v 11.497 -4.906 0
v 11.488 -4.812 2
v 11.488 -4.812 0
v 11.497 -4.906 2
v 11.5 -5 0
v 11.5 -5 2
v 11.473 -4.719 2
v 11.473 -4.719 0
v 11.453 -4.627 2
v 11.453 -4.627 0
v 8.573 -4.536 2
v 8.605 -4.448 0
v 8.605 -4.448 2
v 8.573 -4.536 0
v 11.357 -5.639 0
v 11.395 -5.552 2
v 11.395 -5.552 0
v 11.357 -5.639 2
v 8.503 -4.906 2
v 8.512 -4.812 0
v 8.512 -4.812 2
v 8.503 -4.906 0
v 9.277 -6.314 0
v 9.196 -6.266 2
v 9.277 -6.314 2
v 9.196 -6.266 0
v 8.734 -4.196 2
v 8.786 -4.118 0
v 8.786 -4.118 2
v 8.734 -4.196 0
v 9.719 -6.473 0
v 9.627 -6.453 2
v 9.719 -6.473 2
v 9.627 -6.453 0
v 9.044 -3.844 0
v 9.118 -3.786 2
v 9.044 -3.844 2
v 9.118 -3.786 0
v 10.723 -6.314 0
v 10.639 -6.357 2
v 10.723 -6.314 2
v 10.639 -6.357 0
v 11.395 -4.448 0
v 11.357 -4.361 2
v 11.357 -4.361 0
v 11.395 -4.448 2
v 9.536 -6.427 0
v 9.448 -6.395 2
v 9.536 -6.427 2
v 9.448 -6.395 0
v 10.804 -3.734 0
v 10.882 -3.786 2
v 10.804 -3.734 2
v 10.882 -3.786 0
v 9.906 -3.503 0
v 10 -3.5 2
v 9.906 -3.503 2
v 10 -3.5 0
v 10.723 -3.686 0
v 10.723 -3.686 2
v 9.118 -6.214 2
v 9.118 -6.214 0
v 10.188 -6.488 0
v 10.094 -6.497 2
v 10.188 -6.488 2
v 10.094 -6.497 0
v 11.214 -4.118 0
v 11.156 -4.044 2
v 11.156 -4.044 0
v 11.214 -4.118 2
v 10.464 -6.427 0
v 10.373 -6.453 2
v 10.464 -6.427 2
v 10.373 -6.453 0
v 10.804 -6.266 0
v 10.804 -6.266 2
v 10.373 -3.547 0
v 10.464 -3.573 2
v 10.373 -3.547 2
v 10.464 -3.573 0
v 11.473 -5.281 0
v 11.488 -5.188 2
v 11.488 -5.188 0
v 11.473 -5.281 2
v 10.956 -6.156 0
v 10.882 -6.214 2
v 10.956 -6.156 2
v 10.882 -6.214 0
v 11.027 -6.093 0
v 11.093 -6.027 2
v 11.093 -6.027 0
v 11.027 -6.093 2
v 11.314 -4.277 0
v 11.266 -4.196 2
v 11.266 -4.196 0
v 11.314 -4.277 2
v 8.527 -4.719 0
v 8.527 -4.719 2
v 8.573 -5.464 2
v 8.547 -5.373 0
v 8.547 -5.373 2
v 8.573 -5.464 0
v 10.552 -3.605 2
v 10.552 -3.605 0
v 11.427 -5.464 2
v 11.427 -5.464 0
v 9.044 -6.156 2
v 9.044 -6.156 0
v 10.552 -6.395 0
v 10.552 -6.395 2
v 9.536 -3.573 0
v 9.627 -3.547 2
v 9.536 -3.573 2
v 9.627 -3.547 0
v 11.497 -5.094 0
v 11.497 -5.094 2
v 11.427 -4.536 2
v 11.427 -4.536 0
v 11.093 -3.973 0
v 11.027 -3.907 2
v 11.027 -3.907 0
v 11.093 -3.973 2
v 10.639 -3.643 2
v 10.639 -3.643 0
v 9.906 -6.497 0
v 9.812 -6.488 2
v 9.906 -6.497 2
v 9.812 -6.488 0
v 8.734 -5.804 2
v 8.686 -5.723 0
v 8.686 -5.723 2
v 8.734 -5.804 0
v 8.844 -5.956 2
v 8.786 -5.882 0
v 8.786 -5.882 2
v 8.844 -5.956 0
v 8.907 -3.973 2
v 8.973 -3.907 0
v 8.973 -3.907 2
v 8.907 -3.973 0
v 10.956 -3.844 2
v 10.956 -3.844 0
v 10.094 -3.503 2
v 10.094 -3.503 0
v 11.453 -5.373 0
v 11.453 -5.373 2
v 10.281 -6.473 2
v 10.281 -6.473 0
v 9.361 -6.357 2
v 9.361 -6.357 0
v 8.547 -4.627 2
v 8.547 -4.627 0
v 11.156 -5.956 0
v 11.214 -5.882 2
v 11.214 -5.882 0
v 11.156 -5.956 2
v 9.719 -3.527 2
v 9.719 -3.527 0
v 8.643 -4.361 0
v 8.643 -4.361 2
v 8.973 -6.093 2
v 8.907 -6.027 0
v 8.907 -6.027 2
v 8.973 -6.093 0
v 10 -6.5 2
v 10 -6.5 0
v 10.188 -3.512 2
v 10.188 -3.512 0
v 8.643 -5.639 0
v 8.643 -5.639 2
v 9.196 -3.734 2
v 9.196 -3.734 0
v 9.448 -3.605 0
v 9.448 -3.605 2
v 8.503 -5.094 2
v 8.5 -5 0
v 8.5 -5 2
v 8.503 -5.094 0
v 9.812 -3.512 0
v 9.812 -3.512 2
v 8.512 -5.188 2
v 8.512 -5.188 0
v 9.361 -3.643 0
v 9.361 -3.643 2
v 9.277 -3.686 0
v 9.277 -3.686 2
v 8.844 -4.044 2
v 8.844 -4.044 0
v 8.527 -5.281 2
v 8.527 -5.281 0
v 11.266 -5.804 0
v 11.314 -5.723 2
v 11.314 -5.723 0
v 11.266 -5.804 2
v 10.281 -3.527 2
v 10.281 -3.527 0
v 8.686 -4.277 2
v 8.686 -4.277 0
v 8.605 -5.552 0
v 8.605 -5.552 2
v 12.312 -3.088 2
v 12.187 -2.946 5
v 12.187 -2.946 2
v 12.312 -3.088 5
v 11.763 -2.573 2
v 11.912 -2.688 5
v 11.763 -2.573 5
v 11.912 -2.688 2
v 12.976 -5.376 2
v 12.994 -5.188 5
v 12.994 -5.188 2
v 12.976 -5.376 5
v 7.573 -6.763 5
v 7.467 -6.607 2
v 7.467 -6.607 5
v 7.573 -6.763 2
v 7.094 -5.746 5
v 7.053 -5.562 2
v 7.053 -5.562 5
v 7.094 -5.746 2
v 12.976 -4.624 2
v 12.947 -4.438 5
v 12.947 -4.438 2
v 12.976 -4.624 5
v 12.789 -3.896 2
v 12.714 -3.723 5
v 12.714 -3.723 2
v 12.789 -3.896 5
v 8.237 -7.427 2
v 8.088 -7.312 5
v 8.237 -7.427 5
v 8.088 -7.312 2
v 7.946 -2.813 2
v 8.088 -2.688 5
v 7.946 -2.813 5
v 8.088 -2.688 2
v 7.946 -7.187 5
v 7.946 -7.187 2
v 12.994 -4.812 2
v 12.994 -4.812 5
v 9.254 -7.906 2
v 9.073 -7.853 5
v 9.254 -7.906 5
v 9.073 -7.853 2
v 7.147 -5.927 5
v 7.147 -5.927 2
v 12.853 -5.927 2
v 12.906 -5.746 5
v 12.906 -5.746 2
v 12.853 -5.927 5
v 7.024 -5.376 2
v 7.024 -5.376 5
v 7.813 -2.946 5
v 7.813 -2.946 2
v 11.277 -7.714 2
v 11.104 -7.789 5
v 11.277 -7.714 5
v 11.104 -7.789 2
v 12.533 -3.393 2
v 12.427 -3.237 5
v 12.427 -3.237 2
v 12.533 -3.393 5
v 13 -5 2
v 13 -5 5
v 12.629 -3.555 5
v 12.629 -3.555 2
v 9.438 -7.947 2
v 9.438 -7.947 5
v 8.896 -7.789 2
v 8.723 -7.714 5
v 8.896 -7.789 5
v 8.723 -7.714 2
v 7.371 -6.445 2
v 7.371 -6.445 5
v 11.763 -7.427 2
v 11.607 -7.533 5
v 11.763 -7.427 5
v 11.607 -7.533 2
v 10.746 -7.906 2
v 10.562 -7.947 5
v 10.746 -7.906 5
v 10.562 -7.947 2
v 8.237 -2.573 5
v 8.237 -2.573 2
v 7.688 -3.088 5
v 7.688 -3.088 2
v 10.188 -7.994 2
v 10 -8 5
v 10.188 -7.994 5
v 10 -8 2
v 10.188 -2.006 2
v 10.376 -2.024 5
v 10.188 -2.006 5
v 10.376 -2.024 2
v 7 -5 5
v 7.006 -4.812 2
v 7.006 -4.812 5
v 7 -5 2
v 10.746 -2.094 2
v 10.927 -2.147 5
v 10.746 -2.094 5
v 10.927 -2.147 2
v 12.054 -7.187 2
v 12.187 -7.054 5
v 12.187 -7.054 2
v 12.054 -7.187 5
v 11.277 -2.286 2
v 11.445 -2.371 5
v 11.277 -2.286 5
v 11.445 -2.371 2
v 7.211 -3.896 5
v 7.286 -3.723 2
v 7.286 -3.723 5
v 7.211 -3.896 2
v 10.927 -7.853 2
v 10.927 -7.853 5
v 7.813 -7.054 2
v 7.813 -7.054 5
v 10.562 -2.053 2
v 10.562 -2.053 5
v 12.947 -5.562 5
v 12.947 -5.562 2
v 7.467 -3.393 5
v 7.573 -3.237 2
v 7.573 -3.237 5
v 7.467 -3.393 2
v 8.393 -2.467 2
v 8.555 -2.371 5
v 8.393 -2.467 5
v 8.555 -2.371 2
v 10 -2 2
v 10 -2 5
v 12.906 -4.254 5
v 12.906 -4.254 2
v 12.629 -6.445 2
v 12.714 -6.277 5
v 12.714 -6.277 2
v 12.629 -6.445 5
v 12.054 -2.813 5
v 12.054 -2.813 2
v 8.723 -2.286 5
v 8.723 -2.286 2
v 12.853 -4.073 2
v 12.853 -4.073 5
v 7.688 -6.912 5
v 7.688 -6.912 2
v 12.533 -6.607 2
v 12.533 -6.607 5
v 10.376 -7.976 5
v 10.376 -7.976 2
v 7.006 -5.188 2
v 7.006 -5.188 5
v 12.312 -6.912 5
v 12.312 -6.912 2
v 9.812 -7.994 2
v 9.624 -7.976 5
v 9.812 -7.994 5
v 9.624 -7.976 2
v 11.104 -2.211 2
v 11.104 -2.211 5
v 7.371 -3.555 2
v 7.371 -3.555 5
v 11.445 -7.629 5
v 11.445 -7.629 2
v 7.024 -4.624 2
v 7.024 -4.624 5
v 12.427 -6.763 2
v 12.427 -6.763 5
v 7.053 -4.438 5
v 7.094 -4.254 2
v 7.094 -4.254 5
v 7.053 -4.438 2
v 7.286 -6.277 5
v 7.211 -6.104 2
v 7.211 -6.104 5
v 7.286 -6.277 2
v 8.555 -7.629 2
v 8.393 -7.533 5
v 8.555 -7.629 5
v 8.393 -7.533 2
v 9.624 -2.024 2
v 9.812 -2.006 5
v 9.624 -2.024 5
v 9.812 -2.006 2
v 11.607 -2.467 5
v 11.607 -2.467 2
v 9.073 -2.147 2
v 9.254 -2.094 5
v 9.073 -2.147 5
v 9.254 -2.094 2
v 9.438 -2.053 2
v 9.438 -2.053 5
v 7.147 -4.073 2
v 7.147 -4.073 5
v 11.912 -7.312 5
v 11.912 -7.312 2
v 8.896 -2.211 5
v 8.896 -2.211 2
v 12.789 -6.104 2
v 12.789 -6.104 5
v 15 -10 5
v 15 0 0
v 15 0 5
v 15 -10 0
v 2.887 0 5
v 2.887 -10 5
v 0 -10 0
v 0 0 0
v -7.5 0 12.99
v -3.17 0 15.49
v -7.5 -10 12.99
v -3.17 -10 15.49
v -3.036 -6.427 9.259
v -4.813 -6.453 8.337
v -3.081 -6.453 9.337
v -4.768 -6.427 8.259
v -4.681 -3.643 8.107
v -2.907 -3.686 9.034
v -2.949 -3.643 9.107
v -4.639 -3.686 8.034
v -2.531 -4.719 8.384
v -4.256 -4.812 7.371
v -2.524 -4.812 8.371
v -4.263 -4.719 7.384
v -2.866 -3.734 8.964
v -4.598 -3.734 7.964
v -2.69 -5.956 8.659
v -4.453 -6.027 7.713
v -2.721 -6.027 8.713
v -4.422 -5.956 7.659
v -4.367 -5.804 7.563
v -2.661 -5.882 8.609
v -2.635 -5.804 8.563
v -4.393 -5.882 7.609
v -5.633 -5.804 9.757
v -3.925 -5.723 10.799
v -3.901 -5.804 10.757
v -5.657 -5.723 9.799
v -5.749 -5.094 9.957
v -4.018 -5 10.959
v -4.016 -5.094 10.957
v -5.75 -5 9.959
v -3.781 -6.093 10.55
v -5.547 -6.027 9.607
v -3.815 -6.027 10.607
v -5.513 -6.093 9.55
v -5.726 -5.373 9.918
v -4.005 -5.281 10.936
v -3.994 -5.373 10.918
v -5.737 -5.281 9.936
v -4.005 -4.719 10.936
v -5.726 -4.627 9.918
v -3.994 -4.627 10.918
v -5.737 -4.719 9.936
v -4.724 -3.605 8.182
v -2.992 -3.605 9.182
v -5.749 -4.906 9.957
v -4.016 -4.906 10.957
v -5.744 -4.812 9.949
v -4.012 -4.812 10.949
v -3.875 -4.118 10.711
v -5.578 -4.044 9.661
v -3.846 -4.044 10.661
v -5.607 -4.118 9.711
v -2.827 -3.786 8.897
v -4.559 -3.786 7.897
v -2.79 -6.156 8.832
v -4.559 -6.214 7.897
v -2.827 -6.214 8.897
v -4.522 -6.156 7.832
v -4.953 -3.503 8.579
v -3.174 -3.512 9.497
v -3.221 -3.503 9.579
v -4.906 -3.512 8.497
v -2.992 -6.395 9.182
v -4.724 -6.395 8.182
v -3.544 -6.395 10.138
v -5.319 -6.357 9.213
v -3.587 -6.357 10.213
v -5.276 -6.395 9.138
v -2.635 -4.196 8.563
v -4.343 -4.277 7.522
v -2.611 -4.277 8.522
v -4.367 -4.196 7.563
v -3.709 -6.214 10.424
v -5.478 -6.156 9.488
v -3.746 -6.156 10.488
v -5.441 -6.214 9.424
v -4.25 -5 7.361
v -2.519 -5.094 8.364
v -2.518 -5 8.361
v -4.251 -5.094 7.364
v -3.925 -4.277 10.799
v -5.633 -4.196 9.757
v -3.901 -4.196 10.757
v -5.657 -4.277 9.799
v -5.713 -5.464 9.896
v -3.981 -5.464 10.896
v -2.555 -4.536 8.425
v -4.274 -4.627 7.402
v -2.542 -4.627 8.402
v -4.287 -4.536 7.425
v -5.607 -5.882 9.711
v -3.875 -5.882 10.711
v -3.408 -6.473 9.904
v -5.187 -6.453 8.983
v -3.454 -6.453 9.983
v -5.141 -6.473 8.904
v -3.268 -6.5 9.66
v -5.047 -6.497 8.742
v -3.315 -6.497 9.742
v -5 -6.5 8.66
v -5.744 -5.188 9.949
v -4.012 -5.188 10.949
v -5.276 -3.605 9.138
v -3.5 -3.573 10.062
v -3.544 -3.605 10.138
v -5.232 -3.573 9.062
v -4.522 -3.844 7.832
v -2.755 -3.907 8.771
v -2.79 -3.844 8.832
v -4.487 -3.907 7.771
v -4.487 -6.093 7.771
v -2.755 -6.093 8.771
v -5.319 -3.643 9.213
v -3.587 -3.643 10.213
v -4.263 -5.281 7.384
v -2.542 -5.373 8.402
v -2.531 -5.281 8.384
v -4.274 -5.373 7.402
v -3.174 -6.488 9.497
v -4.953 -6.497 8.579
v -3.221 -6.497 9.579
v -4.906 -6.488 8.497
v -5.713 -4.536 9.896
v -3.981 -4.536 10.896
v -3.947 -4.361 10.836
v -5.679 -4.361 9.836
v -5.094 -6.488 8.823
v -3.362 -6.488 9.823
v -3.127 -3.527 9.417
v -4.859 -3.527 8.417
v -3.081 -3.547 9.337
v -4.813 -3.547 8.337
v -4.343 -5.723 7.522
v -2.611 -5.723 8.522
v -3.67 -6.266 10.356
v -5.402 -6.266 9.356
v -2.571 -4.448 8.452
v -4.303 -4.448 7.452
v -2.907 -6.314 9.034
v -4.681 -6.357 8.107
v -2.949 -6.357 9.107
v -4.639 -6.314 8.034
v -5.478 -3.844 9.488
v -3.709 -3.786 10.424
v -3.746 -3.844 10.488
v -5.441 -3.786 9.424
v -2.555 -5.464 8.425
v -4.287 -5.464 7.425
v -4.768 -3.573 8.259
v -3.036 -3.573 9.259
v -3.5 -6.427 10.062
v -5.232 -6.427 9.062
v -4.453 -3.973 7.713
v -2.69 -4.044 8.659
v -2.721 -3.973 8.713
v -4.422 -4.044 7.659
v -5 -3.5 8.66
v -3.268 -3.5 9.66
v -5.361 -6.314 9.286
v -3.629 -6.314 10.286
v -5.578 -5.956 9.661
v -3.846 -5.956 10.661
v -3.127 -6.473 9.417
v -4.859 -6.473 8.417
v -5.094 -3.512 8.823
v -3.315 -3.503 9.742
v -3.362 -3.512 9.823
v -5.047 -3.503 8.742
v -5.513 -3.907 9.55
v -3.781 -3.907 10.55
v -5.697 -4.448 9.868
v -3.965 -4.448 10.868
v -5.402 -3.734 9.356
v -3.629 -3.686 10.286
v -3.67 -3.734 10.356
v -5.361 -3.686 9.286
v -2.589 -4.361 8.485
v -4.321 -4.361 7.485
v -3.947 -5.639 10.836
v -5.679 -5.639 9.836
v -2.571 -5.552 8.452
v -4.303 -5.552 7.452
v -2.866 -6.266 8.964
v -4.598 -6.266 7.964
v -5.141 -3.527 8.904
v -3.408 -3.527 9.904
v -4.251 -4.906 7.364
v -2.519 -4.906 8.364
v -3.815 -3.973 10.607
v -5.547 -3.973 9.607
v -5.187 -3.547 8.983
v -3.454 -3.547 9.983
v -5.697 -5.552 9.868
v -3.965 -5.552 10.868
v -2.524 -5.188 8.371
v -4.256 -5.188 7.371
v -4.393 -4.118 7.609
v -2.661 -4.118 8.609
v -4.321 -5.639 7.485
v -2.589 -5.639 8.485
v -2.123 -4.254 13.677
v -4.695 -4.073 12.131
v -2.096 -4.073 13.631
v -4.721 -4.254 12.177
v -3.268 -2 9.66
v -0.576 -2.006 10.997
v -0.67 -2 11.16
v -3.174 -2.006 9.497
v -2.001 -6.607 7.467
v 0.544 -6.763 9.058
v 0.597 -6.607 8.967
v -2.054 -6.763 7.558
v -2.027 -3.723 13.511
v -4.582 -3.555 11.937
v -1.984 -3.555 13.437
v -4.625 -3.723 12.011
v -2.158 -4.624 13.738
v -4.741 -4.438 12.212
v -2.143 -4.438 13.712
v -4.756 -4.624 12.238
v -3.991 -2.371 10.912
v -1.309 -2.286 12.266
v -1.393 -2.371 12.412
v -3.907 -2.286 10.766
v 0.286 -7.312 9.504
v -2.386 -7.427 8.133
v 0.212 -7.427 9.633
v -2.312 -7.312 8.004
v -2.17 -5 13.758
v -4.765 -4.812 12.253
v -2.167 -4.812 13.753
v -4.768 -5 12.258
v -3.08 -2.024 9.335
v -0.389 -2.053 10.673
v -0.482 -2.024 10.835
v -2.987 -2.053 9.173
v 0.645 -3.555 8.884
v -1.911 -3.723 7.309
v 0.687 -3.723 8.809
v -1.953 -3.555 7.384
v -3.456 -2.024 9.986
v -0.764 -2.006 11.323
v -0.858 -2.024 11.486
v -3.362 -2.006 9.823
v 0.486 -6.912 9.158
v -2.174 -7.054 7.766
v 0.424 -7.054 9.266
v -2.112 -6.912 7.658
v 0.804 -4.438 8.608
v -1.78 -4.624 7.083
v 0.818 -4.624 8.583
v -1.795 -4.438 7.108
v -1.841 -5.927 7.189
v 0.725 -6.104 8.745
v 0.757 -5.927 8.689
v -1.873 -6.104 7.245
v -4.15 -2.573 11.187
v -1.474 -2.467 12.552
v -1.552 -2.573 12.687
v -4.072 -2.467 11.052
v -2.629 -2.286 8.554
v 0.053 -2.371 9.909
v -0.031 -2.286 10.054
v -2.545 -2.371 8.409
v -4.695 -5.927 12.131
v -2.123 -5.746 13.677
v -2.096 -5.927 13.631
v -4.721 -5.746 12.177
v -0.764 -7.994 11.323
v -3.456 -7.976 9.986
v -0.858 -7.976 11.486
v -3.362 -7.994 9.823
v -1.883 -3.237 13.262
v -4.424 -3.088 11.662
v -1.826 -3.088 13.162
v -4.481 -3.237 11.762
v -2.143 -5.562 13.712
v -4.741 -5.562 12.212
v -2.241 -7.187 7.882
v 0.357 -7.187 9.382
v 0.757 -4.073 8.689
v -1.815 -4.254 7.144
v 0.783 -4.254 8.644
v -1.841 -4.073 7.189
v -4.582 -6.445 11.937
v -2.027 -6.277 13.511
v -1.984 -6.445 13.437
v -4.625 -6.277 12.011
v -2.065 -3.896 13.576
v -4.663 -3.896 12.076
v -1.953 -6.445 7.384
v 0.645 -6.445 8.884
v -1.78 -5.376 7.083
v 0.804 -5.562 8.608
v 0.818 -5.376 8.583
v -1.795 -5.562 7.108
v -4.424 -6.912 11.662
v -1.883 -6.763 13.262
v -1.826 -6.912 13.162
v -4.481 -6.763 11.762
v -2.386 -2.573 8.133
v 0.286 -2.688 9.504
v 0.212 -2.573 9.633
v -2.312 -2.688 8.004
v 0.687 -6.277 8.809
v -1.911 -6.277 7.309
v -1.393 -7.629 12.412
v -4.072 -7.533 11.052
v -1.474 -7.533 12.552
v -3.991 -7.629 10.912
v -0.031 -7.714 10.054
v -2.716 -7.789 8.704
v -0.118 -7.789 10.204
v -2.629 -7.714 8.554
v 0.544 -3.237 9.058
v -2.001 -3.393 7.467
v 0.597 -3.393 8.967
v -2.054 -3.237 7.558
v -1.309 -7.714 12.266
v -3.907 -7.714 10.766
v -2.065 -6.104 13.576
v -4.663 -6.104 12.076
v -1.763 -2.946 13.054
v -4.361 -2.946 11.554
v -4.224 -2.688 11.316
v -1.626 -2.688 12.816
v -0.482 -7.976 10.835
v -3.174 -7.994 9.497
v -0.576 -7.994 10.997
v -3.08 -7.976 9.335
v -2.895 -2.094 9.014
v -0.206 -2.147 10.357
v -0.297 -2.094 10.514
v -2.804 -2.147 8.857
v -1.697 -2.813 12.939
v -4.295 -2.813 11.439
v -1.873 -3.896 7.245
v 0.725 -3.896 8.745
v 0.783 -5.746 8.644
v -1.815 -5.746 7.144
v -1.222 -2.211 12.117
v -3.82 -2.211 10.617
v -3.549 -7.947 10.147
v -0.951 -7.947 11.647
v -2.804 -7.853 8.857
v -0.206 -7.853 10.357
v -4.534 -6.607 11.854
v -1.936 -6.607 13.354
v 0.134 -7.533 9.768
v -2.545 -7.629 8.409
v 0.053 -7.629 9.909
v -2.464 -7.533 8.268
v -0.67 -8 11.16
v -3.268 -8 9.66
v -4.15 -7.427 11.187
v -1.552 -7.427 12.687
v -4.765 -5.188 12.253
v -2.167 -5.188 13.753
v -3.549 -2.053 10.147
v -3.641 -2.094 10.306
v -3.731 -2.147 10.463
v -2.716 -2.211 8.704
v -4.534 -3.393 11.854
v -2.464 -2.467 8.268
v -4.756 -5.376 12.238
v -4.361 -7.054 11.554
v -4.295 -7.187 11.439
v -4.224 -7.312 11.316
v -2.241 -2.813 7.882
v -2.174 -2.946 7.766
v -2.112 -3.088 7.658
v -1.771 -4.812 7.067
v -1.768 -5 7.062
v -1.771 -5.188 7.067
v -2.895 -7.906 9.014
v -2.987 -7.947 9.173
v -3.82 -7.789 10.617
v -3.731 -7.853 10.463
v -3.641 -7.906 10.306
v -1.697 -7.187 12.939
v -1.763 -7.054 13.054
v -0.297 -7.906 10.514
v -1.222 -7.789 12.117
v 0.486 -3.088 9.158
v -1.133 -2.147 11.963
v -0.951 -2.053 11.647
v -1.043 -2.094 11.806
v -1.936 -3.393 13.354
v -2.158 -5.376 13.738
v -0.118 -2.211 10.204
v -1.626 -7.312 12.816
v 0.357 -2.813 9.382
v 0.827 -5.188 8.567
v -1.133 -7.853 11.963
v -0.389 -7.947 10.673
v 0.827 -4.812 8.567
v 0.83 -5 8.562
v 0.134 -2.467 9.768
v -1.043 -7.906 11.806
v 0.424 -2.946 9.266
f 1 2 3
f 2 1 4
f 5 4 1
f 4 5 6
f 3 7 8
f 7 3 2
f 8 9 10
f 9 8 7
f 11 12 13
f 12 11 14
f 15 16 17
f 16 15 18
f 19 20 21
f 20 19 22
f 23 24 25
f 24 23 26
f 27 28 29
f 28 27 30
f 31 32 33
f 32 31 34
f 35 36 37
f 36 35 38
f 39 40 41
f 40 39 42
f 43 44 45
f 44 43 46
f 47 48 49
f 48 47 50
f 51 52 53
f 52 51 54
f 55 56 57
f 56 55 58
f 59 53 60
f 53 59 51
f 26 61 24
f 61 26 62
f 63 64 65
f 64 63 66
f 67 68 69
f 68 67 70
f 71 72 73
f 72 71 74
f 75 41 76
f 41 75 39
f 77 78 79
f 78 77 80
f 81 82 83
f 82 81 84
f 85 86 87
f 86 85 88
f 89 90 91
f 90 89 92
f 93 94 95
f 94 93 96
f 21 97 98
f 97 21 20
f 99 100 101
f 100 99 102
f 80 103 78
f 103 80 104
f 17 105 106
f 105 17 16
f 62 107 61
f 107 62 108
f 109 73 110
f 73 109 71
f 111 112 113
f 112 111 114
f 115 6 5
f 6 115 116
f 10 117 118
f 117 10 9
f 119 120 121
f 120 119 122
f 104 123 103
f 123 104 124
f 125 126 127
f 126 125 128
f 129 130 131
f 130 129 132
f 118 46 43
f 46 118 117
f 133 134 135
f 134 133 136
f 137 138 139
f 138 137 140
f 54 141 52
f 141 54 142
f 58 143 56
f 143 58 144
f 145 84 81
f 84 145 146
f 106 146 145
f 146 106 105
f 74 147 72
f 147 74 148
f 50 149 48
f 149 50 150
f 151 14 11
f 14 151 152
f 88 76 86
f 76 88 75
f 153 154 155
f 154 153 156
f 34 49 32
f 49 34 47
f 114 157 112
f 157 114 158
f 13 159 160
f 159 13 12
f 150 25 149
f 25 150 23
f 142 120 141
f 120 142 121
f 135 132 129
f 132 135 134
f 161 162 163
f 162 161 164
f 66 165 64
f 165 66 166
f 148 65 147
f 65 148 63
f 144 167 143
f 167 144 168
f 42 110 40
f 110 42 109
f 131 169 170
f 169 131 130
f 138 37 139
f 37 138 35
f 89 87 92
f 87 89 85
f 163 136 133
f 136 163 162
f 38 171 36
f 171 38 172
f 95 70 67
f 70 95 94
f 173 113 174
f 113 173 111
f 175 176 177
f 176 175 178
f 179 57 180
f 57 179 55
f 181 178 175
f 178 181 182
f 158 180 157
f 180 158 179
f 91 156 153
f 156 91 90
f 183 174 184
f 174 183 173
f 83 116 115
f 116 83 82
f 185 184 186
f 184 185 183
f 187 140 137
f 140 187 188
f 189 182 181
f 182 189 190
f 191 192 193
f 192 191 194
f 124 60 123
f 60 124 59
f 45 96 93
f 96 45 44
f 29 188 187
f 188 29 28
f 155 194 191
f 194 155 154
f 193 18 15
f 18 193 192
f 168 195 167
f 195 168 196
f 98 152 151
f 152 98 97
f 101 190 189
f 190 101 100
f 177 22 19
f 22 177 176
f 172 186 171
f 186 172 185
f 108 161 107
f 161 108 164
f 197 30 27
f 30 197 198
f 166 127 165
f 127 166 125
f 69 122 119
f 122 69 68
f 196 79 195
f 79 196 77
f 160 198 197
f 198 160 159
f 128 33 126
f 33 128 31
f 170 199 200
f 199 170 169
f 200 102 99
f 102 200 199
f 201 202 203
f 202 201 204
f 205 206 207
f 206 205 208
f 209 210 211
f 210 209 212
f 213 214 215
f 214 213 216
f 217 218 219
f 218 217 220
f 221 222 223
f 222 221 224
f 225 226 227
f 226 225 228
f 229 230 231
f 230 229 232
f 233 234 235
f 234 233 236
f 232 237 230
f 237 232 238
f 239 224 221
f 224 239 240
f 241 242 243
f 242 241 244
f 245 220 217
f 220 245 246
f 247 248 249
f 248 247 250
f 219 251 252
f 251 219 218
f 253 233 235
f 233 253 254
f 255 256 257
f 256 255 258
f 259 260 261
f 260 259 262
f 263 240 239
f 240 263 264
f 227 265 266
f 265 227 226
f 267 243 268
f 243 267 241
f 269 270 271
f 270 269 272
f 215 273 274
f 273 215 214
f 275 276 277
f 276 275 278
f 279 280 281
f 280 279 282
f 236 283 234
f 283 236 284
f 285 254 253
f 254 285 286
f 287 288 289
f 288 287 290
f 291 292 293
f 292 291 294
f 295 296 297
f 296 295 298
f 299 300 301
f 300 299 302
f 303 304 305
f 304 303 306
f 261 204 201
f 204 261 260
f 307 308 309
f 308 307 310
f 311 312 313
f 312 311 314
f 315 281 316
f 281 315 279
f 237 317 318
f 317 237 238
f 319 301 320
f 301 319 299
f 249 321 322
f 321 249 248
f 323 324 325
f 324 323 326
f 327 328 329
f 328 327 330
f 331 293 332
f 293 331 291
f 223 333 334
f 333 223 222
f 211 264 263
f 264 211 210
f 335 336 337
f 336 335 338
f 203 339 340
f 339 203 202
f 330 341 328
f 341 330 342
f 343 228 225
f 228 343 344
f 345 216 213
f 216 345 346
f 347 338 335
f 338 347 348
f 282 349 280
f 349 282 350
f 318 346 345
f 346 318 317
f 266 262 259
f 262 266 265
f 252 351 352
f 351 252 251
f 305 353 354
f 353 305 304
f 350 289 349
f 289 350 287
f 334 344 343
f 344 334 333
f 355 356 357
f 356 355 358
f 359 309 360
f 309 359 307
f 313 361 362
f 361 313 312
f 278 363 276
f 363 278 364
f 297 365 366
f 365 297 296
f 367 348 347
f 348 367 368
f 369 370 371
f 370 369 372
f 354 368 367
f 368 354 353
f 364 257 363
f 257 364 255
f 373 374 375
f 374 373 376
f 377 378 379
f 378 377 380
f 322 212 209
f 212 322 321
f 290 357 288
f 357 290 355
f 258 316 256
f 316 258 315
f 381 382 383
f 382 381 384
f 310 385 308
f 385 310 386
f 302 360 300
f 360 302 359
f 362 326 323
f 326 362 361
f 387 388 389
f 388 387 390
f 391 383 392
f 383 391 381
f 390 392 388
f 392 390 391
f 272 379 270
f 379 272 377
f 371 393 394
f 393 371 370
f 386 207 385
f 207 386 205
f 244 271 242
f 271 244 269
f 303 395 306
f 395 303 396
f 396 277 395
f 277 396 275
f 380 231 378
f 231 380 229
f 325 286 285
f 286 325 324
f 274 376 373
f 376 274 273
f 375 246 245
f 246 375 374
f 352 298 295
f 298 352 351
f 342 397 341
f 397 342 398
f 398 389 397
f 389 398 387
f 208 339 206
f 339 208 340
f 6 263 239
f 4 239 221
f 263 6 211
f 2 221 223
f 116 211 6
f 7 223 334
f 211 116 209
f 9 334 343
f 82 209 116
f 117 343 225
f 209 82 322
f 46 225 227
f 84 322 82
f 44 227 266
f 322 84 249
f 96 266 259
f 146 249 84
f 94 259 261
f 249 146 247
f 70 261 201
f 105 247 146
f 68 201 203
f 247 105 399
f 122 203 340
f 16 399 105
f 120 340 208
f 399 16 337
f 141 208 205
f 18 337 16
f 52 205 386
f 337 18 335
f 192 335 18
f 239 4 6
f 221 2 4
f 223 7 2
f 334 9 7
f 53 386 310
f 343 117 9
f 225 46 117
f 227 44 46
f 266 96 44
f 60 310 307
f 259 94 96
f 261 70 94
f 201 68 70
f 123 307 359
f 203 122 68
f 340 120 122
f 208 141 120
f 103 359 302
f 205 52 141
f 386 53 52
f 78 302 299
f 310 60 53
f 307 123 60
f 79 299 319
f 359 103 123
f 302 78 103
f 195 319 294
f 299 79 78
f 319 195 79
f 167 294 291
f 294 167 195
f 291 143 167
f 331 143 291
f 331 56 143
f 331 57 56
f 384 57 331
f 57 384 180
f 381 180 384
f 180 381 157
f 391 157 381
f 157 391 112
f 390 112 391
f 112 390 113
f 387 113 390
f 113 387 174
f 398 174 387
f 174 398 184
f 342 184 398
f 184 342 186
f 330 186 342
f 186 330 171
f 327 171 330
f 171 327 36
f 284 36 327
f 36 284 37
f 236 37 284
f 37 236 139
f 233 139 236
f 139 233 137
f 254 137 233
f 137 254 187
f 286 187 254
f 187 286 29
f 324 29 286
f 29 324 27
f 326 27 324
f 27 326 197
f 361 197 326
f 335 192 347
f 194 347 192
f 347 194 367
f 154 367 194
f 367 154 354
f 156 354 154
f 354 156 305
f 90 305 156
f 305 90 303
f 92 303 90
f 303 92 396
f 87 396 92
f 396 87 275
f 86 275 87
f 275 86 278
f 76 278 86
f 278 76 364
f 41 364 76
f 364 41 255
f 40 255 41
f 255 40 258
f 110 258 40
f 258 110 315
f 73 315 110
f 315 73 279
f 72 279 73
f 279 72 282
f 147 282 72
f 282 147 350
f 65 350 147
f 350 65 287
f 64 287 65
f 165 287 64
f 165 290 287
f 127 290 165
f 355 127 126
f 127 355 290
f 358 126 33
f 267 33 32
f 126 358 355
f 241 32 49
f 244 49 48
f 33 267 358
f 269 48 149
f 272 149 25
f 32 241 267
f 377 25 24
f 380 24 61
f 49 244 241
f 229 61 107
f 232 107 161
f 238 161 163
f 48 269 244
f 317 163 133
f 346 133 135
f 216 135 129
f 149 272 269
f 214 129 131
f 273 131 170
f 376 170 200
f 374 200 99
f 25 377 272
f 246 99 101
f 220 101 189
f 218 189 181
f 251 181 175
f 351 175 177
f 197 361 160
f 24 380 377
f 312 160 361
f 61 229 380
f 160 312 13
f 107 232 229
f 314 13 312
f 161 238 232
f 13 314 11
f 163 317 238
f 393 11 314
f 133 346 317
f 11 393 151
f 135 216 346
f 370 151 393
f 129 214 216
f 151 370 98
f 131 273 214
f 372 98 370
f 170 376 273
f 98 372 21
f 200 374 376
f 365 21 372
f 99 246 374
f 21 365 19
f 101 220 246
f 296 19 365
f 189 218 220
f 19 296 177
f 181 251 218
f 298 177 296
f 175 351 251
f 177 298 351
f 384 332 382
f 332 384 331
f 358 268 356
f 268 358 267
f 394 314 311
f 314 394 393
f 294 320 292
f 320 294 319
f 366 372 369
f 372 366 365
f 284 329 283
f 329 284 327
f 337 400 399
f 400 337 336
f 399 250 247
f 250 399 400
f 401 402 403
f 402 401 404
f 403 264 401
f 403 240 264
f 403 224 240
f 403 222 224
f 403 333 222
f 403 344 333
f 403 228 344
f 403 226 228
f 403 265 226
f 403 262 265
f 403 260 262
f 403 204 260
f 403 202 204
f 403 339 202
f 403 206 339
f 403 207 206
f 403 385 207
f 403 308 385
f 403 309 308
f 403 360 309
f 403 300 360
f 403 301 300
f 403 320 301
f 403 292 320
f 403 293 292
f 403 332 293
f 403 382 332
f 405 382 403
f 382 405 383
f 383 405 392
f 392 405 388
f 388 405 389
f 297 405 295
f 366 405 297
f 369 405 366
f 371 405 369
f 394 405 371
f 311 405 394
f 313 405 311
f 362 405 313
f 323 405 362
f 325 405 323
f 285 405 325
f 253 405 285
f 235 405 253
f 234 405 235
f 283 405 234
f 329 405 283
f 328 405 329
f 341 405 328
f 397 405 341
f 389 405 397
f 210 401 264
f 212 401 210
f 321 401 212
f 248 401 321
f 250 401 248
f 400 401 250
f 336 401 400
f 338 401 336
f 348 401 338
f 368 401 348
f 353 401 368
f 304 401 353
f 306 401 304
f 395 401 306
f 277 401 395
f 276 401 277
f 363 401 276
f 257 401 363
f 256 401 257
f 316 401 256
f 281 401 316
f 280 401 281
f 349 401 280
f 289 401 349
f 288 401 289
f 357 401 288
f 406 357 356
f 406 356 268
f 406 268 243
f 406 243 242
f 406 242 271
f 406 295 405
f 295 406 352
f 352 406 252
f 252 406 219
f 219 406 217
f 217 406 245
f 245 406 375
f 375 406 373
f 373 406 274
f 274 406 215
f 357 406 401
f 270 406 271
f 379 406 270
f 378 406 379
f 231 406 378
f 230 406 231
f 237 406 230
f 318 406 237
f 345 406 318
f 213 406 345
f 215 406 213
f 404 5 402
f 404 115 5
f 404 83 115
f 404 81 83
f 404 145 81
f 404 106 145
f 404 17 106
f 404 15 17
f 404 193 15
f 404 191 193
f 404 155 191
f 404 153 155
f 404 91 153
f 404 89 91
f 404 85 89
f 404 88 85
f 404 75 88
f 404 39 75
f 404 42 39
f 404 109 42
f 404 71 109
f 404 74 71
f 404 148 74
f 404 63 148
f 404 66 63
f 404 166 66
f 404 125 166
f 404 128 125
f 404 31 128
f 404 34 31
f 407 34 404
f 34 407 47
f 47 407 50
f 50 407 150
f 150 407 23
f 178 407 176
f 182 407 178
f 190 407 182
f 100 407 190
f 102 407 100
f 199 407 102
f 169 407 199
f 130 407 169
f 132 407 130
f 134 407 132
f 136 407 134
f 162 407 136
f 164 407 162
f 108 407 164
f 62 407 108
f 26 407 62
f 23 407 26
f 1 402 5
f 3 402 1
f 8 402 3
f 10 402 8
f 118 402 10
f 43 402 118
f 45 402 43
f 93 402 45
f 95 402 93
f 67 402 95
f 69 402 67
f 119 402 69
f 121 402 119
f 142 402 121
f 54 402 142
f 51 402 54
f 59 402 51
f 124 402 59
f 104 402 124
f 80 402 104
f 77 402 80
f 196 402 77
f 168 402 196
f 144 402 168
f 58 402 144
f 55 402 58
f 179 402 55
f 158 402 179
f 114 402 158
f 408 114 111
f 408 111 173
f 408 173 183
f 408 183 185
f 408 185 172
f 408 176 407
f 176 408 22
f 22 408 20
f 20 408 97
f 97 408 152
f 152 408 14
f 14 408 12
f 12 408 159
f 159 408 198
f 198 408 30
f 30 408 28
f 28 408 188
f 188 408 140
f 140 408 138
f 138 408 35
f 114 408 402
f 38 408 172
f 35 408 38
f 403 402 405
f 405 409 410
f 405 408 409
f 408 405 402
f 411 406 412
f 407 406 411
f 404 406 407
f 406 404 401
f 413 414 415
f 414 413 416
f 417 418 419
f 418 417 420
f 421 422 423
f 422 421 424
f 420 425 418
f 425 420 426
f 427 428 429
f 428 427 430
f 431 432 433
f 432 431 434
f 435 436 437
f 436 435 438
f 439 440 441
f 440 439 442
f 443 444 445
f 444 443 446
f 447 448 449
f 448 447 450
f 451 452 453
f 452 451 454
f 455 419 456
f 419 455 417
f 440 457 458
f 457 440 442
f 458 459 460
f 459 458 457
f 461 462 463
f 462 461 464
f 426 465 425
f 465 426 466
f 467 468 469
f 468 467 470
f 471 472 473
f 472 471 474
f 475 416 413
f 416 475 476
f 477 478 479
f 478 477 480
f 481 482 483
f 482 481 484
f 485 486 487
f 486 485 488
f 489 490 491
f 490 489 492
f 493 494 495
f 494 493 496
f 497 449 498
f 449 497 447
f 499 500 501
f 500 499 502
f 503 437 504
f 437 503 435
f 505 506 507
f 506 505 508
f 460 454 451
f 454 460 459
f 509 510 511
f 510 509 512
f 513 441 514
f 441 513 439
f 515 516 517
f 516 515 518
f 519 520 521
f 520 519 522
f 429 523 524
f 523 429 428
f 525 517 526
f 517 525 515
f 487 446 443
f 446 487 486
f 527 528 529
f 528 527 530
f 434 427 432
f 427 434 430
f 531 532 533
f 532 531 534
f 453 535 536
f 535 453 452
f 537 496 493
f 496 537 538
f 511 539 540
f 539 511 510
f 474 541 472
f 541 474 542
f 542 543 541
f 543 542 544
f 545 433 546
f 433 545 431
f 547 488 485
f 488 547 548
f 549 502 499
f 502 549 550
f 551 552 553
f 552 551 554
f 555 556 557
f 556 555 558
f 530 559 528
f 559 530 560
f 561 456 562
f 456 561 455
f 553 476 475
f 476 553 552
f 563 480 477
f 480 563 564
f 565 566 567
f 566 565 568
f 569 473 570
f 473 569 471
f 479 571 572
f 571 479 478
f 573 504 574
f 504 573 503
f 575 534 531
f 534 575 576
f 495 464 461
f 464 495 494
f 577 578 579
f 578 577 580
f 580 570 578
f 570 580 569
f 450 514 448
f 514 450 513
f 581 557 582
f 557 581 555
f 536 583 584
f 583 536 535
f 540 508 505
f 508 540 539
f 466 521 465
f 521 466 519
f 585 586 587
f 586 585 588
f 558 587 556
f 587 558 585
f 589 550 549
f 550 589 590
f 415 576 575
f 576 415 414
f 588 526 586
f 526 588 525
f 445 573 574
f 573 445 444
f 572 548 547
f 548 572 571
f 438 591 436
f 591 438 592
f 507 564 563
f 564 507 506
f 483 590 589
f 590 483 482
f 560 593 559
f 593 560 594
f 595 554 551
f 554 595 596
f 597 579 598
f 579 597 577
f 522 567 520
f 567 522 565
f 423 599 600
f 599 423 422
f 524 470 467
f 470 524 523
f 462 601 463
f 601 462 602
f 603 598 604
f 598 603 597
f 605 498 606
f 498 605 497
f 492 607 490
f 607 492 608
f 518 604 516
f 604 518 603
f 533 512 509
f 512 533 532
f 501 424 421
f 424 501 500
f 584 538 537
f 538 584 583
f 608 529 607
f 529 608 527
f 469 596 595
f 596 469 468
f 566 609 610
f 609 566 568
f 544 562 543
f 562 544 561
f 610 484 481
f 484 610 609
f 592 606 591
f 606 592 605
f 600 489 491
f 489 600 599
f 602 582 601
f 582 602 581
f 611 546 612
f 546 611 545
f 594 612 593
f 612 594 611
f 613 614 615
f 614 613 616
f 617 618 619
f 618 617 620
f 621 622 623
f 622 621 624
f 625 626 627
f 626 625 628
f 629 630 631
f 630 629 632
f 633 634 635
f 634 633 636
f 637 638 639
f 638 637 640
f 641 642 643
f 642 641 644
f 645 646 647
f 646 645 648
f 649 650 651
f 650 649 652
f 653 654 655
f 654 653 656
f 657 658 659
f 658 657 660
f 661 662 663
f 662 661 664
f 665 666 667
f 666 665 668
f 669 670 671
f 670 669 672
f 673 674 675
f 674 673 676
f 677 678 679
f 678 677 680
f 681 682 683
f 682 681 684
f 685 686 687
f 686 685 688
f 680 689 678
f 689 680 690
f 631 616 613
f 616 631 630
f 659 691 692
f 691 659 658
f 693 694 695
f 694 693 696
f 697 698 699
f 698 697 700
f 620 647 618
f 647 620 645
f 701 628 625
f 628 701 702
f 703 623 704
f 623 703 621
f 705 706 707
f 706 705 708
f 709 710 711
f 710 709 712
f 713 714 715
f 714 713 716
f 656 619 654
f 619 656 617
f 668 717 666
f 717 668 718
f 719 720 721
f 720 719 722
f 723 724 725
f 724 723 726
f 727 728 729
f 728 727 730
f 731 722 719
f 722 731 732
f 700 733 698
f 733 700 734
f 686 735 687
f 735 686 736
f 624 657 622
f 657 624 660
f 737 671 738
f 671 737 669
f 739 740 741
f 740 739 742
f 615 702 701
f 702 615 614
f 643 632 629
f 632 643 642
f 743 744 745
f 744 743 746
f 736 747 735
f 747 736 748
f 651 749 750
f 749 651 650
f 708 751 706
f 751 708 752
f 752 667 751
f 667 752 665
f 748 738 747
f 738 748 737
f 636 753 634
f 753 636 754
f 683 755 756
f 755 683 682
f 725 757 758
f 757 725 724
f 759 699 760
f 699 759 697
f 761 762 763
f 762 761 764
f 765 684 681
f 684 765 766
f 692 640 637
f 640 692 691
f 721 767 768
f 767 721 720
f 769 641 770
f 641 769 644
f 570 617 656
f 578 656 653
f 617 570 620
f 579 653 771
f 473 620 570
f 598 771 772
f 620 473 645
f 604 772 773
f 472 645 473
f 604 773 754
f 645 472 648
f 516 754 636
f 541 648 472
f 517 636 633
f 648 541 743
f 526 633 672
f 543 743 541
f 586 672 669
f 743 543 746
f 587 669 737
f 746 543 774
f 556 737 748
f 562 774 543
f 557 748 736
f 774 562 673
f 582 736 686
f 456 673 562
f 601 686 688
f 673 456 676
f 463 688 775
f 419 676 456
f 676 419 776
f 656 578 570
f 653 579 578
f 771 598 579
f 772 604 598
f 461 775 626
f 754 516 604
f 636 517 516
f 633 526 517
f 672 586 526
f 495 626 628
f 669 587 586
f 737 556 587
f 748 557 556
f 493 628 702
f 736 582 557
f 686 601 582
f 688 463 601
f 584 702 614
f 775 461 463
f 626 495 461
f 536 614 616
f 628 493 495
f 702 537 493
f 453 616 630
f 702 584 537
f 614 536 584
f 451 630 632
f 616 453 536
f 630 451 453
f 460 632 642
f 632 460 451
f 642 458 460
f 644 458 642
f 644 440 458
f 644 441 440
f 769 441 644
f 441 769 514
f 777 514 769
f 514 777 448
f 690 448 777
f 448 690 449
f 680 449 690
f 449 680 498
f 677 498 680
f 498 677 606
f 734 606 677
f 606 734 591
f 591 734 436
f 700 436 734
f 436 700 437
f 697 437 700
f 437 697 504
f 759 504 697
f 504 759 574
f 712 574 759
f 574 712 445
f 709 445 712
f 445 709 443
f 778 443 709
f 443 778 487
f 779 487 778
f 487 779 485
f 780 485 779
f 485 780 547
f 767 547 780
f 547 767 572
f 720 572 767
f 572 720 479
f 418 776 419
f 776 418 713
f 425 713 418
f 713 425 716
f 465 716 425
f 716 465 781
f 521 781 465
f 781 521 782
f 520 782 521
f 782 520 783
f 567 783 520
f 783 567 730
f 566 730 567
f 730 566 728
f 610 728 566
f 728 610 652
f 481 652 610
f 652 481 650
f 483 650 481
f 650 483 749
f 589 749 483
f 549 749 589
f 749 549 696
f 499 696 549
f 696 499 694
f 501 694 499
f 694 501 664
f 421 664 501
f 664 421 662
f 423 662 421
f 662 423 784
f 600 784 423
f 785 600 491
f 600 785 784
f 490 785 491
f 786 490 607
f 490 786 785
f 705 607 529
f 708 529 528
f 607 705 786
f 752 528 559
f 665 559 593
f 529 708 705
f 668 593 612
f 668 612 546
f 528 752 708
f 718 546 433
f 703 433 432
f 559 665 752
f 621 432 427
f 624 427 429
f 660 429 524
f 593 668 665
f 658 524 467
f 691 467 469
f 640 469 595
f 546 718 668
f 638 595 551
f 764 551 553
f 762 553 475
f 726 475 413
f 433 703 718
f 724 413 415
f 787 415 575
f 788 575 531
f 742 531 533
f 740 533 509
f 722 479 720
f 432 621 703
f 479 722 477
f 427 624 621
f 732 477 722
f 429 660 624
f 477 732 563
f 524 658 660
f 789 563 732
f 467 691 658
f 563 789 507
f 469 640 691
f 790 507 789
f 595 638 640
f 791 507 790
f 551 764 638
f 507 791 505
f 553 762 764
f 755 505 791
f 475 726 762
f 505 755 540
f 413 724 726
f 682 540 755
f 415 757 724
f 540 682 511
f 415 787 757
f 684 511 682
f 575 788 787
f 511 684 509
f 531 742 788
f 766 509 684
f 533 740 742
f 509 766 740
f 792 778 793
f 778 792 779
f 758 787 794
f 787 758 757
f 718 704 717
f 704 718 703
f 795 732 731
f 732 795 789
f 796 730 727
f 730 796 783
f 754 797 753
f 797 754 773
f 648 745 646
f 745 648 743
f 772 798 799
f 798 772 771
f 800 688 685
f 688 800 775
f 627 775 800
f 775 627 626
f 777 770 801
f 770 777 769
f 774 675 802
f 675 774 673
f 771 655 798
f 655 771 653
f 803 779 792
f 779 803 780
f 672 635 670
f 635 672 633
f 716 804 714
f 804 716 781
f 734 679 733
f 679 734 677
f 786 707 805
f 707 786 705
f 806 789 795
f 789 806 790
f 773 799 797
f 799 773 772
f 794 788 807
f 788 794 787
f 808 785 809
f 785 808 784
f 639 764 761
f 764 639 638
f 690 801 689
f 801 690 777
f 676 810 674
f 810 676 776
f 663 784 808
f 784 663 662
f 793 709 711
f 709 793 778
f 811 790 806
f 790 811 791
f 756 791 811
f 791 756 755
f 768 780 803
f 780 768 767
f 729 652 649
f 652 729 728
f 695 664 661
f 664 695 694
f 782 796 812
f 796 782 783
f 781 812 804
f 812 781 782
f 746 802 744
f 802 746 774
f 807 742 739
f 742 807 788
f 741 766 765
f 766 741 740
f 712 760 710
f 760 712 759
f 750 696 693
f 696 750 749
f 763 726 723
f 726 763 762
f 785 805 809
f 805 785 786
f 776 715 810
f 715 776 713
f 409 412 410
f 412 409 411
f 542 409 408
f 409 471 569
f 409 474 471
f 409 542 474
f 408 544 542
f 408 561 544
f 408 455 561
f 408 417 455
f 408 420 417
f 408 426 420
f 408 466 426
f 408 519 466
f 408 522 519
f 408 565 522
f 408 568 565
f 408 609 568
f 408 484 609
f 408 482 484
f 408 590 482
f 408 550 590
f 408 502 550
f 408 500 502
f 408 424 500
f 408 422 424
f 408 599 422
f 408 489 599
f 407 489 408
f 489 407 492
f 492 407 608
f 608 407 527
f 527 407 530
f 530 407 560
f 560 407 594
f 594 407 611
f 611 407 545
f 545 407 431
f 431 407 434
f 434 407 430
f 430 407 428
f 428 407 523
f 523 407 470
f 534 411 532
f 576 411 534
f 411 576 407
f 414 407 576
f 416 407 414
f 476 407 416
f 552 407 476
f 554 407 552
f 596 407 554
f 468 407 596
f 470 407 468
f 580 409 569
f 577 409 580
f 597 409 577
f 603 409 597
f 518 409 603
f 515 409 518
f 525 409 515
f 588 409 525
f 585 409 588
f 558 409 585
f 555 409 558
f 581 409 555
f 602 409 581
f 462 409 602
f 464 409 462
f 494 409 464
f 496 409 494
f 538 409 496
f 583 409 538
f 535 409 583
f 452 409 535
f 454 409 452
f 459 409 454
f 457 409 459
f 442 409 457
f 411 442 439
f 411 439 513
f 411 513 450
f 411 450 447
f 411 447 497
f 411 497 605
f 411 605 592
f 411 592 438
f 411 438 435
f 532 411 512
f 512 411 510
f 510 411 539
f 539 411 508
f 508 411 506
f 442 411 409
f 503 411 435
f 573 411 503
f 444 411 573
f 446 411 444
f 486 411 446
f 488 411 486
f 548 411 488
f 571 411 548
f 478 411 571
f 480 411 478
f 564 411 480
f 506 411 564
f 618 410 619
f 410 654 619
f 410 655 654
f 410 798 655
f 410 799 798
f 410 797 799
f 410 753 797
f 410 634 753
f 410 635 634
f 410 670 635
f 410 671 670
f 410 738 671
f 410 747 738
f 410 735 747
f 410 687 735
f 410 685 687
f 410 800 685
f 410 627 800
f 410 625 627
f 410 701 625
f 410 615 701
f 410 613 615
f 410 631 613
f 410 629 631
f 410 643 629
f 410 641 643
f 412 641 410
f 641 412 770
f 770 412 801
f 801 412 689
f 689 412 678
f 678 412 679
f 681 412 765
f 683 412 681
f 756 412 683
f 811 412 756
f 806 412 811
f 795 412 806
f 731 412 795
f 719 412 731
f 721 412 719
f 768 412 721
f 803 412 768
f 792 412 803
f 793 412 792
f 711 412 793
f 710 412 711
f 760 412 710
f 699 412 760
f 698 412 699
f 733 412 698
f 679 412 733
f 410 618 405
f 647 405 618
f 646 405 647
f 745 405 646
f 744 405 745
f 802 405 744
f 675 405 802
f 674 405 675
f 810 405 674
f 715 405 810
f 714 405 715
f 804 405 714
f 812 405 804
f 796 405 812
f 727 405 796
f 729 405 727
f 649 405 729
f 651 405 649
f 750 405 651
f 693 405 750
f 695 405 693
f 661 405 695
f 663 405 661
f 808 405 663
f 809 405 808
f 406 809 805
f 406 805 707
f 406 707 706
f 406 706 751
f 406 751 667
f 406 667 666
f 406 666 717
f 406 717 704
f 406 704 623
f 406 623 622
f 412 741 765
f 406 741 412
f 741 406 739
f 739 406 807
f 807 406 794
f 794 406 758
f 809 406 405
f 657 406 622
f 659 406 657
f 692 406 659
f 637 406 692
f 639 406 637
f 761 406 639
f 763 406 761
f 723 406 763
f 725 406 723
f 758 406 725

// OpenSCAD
// ************* Credits part *************
// "Fixing customize w" 
// Programmed by Rudy RUFFEL - Decembre 2014
// Optimized for Customizer makerbot
//
//
//********************** License ******************
//**         "Fixing customize" by rr2s          **
//**  is licensed under the Creative Commons     **
//** - Attribution - Non-Commercial license.     **
//*************************************************
//
//
// ************* Declaration part *************

/* [Dimensions] */ 
// (Width this number will be multiplied by the number of screws on height (in mm). Example : if you specify 15mm and there are two screws on height, the total height will be 30mm. The thickness of wall is proportional to the width if you indicates a width 15mm  the thickness will  5mm. But you can change if you wantt hickness in tab)
Width         = 15;       
// (Length of fixing this number will multipier by the number of screw on length (in mm). Example : if you specify 10 and there are two screws on length, the total length will be 20.)
Height        = 10;
// Angle is 60 °. It can not be over because the screws not spend mounting. You can choose an angle between 90 ° and 0 °.
angle = 60;


/* [screw] */
// (number of height screw, if you want one screw.)
NumberOfScrewHeight  = 1;
// (number of width screw)
NumberOfScrewWidth = 1  ; 
// (diameter of screw) 
DiametreScrew = 3;        
// (screw head diameter of generally 2 times the diameter of the screw. Attention ! Check that the width and height is supperior in diameter screws.)
DiametreHeadScrew = 6;
// (Height of the screw head, if you want that screw is flush chose 0. Attention ! Check that the width and height is supperior in diameter screws.)
HeightHeadScrew   = 3;
// (Resolution of screws)
ResolutionScrew=100; //[20:Draft,50:Medium,100:Fine, 200:Very fine]
	RS = ResolutionScrew;
// (Creates a hex or cylindrical head screws)
ResolutionHeadScrew=100; //[6:Bolt (hex),20:Draft,50:Medium,100:Fine, 200:Very fine]
	RH = ResolutionHeadScrew;


/* [Thickness] */
//(Thickness Wall is normaly proportional to the width (Width/3) if ThicknessWall = 0. But you can change if you want. Attention ! Check that the Thickness Wall is supperior at HeightHeadScrew.the dimention is in mm)
ThicknessWall = 0;



// ************* private variable *************
	//TH = Width/3;  //  ThicknessWall base if ThicknessWall = 0
	TH= ThicknessWall == 0  ? Width/3 : ThicknessWall;
	W = Width;     // Simplifying the Variable : Width 
	H = Height;    // Simplifying the Variable : Height
    NbScrew = NumberOfScrewHeight -1; // Simplifying the Variable : NumberOfScrewHeight
	rScrew = DiametreScrew/2;      // radius of the screw
	CWS = TH+((W-TH)/2); // centering the screw on width
	CHS = H/2; // centering the screw on Height
	rHScrew = DiametreHeadScrew/2;  //radius of the Head screw
	HHS = HeightHeadScrew; // Simplifying the Variable : HeightHeadScrew
	NbScrewWidth = NumberOfScrewWidth-1; // Simplifying the Variable :  NumberOfScrewWith


// ************* Executable part *************
union(){
    difference(){
        Base1();
        Cut();
    }

    rotate([0,angle-90,0])difference(){
        Base2();
        Cut();
    }
}



// ************* Module part simple screw *************

// Module de construction
module BaseVolume1(){
	for ( i = [0 : NbScrew] ){
		translate([0,(H*i)-H,0])  cube([W,H,TH]);
		}
}

// Module de construction
module BaseVolume2(){
	for ( i = [0 : NbScrew] ){
		translate([TH,(H*i)-H,0]) rotate([0,-90,0]) cube([W,H,TH]);
		}
}

module BaseScrew(){
	for ( i = [0 : NbScrew] ){
		translate([CWS,CHS+((i*H)-H),-W]) cylinder(W*2,rScrew,rScrew,$fn=RS);
		translate([W,CHS+((i*H)-H),CWS]) rotate([0,-90,0]) cylinder(W*2,rScrew,rScrew,$fn=RS);
	}
}

module BaseScrewHead(){
	for ( i = [0 : NbScrew] ){
		translate([CWS,CHS+((i*H)-H),TH-HHS]) cylinder(W*2,rHScrew,rHScrew,$fn=RH);
		translate([(W*2)+TH-HHS,CHS+((i*H)-H),CWS]) rotate([0,-90,0]) cylinder(W*2,rHScrew,rHScrew,$fn=RH);
	}
}

// ************* Module part multi-screw *************

 module BaseVolume1MultiScrew(){
	for ( e = [0 : NbScrewWidth] ){
		for ( i = [0 : NbScrew] ){
			union() {
			translate([(W-TH)*e+TH,(H*i)-H,0])cube([W-TH,H,TH]);
			}
		}
	}
}

 module BaseVolume2MultiScrew(){
	for ( e = [0 : NbScrewWidth] ){
		for ( i = [0 : NbScrew] ){
			union() {
			translate([TH,(H*i)-H,(W-TH)*e+TH]) rotate([0,-90,0]) cube([W-TH,H,TH]);
			}
		}
	}
}


module BaseScrewMulti(){
	for ( e = [0 : NbScrewWidth] ){
		for ( i = [0 : NbScrew] ){
			translate([CWS+((W-TH)*e),CHS+((i*H)-H),-W]) cylinder(W*2,rScrew,rScrew,$fn=RS);
			translate([W,CHS+((i*H)-H),CWS+(W-TH)*e]) rotate([0,-90,0]) cylinder(W*2,rScrew,rScrew,$fn=RS);
		}
	}
}


module BaseScrewHeadmulti(){
	for ( e = [0 : NbScrewWidth] ){
		for ( i = [0 : NbScrew] ){
			translate([CWS+((W-TH)*e),CHS+((i*H)-H),TH-HHS]) cylinder(W*2,rHScrew,rHScrew,$fn=RH);
			translate([(W*2)+TH-HHS,CHS+((i*H)-H),CWS+(W-TH)*e]) rotate([0,-90,0]) cylinder(W*2,rHScrew,rHScrew,$fn=RH);
		}
	}
}

// ************* Module grouping : base and cut  *************

// module of base
module Base1(){
        BaseVolume1();
		if (NbScrew > 0 || NbScrewWidth > 0) {
		BaseVolume1MultiScrew();
		}
}

// module of base
module Base2(){
		BaseVolume2();
		if (NbScrew > 0 || NbScrewWidth > 0) {
        BaseVolume2MultiScrew();   
		}
}



// module of cut
module Cut(){
	BaseScrew();
	BaseScrewHead();
 	if (NbScrew > 0 || NbScrewWidth > 0) {
	BaseScrewMulti();
	BaseScrewHeadmulti();
	}
}
